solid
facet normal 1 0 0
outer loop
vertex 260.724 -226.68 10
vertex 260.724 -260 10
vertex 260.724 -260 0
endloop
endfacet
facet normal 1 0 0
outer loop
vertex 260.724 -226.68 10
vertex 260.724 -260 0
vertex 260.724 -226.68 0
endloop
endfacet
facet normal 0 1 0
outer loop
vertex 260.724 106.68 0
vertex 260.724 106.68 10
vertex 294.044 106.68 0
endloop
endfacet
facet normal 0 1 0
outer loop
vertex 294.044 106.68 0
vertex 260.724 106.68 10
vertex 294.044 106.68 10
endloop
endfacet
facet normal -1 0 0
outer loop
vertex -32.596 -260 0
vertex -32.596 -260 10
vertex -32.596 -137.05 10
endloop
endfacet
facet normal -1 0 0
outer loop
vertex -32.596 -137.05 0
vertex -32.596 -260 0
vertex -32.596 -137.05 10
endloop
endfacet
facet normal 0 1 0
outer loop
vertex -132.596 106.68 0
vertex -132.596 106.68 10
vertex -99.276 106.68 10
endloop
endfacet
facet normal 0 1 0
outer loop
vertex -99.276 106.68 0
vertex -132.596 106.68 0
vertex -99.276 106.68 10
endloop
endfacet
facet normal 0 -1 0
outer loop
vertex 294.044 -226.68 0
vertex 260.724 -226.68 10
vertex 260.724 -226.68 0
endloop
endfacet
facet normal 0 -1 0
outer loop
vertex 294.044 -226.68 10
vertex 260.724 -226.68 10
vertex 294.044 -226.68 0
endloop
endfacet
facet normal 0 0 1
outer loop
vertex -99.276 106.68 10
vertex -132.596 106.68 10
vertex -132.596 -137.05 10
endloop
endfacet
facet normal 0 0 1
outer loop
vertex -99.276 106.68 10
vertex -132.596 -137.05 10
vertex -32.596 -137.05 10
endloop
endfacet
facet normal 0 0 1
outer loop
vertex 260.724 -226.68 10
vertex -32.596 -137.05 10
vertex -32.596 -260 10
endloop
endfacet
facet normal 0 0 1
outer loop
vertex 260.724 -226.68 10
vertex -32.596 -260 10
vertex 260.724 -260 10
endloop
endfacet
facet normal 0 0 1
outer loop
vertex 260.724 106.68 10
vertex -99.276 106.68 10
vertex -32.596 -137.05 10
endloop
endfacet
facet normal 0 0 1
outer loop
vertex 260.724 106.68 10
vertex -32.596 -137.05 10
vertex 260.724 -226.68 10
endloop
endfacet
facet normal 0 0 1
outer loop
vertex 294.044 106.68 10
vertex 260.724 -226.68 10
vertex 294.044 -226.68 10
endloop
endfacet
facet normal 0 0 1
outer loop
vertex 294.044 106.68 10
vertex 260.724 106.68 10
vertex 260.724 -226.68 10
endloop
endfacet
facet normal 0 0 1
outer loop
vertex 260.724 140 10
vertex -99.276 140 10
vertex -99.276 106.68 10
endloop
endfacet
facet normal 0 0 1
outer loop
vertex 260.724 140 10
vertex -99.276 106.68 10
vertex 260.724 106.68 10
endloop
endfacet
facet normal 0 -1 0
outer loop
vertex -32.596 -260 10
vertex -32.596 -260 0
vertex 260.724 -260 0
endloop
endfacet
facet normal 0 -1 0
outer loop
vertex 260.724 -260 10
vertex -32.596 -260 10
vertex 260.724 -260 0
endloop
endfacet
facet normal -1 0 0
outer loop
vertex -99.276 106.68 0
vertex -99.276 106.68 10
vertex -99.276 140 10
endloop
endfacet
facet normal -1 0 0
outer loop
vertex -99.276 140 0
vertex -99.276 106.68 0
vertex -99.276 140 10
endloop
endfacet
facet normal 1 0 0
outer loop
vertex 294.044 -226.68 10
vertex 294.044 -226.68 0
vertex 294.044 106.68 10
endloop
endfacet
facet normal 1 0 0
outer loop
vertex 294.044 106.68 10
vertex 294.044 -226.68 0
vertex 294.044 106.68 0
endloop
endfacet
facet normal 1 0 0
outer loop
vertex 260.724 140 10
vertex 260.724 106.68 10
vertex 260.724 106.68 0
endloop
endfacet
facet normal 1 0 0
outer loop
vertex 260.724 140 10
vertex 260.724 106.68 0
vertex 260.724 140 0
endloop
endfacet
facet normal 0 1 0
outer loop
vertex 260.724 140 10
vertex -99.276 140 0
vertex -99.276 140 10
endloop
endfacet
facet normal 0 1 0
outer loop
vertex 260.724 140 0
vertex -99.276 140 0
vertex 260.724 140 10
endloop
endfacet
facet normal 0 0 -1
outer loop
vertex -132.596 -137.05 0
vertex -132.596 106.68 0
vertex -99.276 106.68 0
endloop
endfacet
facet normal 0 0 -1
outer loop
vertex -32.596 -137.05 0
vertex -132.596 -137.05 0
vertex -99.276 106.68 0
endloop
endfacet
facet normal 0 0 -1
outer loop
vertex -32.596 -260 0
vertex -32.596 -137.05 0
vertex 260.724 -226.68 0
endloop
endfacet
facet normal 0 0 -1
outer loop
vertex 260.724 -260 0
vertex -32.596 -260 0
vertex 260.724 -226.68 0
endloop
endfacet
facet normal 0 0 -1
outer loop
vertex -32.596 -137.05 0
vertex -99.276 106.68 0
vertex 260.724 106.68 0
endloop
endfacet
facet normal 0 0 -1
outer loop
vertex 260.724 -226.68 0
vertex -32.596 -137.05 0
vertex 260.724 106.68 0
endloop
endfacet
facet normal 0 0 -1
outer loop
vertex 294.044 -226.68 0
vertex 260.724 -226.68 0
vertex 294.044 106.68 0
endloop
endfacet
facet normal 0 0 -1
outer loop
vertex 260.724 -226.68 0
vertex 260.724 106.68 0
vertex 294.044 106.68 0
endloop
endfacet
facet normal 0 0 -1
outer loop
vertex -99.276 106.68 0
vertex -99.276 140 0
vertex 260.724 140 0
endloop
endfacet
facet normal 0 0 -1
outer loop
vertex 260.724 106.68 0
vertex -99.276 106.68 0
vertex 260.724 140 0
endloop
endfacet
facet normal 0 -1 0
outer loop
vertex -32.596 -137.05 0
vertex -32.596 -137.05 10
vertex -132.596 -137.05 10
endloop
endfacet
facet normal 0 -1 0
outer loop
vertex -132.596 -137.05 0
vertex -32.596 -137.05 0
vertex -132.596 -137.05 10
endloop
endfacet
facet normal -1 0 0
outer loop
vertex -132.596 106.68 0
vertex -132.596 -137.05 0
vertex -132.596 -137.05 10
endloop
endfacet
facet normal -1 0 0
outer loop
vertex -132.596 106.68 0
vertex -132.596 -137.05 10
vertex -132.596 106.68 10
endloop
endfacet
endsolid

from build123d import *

# Parameters (mm, degrees)
CROQUIS1_W              = 426.64
CROQUIS1_H              = 400
SALIENTE_EXTRUIR1_DEPTH = 10
CROQUIS2_W              = 33.32
CROQUIS2_H              = 33.32
CORTAR_EXTRUIR1_DEPTH   = 393.634757764
CORTAR_EXTRUIR2_DEPTH   = 393.634757764


with BuildPart() as part:
    # Croquis1 → Saliente-Extruir1 (new body)
    with BuildSketch(Plane.XY):
        with Locations((80.724304492, -60)):
            Rectangle(CROQUIS1_W, CROQUIS1_H)
    extrude(amount=SALIENTE_EXTRUIR1_DEPTH)

    # Croquis2 → Cortar-Extruir1 (cut, through all)
    with BuildSketch(Plane.XY.offset(10)):
        with Locations((-115.935695508, -243.34)):
            Rectangle(CROQUIS2_W, CROQUIS2_H)
        with Locations((-115.935695508, 123.34)):
            Rectangle(CROQUIS2_W, CROQUIS2_H)
        with Locations((277.384304492, 123.34)):
            Rectangle(CROQUIS2_W, CROQUIS2_H)
        with Locations((277.384304492, -243.34)):
            Rectangle(CROQUIS2_W, CROQUIS2_H)
    extrude(amount=-CORTAR_EXTRUIR1_DEPTH, mode=Mode.SUBTRACT)

    # Croquis3 → Cortar-Extruir2 (cut, through all)
    with BuildSketch(Plane.XY.offset(10)):
        Polygon((-132.595695508, -137.05), (-132.595695508, -226.68), (-99.275695508, -226.68), (-99.275695508, -260), (-32.595695508, -260), (-32.595695508, -137.05), align=None)
    extrude(amount=-CORTAR_EXTRUIR2_DEPTH, mode=Mode.SUBTRACT)


solid = part.part
